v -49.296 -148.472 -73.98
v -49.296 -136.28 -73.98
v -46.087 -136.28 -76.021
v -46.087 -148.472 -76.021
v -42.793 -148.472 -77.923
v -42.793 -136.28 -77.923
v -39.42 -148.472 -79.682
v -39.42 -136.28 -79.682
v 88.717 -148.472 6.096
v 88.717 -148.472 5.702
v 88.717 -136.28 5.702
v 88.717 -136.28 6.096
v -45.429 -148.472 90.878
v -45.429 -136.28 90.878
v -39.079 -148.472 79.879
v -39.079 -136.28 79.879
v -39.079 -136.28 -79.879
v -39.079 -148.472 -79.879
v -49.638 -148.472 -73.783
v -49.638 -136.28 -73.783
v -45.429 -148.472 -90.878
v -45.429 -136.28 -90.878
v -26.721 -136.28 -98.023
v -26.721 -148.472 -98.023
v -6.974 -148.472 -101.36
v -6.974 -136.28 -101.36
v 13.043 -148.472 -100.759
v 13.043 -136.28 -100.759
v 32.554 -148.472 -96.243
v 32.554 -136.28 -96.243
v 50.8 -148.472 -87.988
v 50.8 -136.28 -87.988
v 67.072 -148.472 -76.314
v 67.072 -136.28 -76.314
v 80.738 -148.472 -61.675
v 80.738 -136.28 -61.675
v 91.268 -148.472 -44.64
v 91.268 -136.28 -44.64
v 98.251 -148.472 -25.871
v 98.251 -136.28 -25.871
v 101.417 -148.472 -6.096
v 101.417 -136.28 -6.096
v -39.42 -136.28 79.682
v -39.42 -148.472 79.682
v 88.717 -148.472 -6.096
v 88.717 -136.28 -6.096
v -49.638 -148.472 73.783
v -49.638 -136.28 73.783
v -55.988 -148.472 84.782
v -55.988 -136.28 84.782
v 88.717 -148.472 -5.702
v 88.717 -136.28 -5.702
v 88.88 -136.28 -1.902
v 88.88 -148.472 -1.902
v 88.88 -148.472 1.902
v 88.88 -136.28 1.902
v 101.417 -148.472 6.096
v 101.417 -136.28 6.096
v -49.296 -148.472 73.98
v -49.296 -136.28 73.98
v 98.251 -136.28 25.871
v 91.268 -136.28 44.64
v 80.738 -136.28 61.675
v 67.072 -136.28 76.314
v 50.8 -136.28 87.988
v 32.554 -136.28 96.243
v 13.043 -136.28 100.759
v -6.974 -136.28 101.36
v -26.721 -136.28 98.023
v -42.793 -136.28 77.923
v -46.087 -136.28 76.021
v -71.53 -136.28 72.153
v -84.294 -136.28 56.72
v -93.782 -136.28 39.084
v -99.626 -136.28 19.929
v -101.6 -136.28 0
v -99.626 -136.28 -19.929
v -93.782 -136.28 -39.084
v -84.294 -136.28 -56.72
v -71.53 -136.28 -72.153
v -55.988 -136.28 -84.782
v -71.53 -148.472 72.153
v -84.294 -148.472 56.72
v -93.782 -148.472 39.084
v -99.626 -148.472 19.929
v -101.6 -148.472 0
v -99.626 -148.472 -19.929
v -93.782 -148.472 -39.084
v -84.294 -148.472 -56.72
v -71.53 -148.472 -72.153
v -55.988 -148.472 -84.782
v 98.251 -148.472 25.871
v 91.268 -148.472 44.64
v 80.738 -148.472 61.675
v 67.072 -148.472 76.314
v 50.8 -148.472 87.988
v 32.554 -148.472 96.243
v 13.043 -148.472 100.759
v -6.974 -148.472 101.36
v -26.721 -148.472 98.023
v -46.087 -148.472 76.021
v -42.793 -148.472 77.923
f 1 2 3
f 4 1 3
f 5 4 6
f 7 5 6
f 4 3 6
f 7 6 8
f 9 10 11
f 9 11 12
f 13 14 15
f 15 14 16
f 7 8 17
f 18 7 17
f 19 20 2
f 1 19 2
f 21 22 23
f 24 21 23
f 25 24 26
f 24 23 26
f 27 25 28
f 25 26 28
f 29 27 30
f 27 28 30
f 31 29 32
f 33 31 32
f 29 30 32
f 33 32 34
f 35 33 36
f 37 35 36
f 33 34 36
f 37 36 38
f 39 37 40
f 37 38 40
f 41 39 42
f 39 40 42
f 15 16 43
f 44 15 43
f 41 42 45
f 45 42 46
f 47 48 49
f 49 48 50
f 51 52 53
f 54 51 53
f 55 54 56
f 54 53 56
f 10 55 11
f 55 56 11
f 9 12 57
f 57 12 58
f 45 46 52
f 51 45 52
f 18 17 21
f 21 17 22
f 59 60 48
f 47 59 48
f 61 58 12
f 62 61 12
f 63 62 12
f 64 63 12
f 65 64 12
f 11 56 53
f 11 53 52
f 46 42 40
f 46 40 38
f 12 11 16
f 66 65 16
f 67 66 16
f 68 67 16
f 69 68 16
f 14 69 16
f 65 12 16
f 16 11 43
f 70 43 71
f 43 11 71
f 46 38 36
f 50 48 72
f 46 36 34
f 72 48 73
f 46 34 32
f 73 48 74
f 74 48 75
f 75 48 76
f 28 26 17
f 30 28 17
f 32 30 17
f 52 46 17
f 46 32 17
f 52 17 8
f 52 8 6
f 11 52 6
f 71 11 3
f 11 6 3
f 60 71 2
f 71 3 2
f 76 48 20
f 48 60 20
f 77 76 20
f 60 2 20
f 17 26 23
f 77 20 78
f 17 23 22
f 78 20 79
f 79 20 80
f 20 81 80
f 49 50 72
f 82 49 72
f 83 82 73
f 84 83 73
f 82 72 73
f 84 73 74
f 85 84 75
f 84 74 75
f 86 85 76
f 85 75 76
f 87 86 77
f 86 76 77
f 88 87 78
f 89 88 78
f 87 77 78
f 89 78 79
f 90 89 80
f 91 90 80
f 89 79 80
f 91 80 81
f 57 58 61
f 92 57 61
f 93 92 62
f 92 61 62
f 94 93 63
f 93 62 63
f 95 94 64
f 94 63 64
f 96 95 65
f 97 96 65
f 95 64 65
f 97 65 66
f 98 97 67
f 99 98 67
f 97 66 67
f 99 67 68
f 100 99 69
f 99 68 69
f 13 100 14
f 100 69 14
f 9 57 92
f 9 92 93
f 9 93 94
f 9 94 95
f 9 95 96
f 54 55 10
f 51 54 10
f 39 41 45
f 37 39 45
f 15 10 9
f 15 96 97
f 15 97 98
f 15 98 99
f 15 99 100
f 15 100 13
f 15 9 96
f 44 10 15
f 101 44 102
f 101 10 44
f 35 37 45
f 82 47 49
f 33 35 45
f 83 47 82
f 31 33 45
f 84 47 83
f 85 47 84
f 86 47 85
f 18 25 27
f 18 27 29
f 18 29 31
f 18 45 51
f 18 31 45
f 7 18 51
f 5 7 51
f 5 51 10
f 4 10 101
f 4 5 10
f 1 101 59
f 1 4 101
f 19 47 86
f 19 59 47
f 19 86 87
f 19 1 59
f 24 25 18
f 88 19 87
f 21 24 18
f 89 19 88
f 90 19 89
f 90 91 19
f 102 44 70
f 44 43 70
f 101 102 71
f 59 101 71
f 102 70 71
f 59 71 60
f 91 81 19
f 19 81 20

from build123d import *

# Parameters (mm, degrees)
SKETCH1_W           = 88.9
SKETCH1_H           = 12.192
BOSS_EXTRUDE1_DEPTH = 12.192


with BuildPart() as part:
    # Sketch1 → Revolve1 (revolve)
    with BuildSketch(Plane.XY, mode=Mode.PRIVATE) as revolve1_sk:
        with Locations((44.45, -142.376222222)):
            Rectangle(SKETCH1_W, SKETCH1_H)
    revolve(revolve1_sk.sketch.rotate(Axis((0, 0, 0), (0, -1, 0)), 180), axis=Axis((0, 0, 0), (0, -1, 0)))

    # Sketch2 → Boss-Extrude1 (add)
    with BuildSketch(Plane(origin=(0, -136.280222222, 0), x_dir=(1, 0, 0), z_dir=(0, 1, 0))):
        with BuildLine():
            Line((101.416955111, 6.096), (88.716955111, 6.096))
            Line((88.716955111, 6.096), (88.716955111, -6.096))
            Line((88.716955111, -6.096), (101.416955111, -6.096))
            ThreePointArc((101.416955111, -6.096), (50.8, -87.988181024), (-45.429186694, -90.877659501))
            Line((-45.429186694, -90.877659501), (-39.079186694, -79.879136873))
            Line((-39.079186694, -79.879136873), (-49.637768417, -73.783136873))
            Line((-49.637768417, -73.783136873), (-55.987768417, -84.781659501))
            ThreePointArc((-55.987768417, -84.781659501), (-101.6, 0), (-55.987768417, 84.781659501))
            Line((-55.987768417, 84.781659501), (-49.637768417, 73.783136873))
            Line((-49.637768417, 73.783136873), (-39.079186694, 79.879136873))
            Line((-39.079186694, 79.879136873), (-45.429186694, 90.877659501))
            ThreePointArc((-45.429186694, 90.877659501), (50.8, 87.988181024), (101.416955111, 6.096))
        make_face()
    extrude(amount=-BOSS_EXTRUDE1_DEPTH)


solid = part.part
